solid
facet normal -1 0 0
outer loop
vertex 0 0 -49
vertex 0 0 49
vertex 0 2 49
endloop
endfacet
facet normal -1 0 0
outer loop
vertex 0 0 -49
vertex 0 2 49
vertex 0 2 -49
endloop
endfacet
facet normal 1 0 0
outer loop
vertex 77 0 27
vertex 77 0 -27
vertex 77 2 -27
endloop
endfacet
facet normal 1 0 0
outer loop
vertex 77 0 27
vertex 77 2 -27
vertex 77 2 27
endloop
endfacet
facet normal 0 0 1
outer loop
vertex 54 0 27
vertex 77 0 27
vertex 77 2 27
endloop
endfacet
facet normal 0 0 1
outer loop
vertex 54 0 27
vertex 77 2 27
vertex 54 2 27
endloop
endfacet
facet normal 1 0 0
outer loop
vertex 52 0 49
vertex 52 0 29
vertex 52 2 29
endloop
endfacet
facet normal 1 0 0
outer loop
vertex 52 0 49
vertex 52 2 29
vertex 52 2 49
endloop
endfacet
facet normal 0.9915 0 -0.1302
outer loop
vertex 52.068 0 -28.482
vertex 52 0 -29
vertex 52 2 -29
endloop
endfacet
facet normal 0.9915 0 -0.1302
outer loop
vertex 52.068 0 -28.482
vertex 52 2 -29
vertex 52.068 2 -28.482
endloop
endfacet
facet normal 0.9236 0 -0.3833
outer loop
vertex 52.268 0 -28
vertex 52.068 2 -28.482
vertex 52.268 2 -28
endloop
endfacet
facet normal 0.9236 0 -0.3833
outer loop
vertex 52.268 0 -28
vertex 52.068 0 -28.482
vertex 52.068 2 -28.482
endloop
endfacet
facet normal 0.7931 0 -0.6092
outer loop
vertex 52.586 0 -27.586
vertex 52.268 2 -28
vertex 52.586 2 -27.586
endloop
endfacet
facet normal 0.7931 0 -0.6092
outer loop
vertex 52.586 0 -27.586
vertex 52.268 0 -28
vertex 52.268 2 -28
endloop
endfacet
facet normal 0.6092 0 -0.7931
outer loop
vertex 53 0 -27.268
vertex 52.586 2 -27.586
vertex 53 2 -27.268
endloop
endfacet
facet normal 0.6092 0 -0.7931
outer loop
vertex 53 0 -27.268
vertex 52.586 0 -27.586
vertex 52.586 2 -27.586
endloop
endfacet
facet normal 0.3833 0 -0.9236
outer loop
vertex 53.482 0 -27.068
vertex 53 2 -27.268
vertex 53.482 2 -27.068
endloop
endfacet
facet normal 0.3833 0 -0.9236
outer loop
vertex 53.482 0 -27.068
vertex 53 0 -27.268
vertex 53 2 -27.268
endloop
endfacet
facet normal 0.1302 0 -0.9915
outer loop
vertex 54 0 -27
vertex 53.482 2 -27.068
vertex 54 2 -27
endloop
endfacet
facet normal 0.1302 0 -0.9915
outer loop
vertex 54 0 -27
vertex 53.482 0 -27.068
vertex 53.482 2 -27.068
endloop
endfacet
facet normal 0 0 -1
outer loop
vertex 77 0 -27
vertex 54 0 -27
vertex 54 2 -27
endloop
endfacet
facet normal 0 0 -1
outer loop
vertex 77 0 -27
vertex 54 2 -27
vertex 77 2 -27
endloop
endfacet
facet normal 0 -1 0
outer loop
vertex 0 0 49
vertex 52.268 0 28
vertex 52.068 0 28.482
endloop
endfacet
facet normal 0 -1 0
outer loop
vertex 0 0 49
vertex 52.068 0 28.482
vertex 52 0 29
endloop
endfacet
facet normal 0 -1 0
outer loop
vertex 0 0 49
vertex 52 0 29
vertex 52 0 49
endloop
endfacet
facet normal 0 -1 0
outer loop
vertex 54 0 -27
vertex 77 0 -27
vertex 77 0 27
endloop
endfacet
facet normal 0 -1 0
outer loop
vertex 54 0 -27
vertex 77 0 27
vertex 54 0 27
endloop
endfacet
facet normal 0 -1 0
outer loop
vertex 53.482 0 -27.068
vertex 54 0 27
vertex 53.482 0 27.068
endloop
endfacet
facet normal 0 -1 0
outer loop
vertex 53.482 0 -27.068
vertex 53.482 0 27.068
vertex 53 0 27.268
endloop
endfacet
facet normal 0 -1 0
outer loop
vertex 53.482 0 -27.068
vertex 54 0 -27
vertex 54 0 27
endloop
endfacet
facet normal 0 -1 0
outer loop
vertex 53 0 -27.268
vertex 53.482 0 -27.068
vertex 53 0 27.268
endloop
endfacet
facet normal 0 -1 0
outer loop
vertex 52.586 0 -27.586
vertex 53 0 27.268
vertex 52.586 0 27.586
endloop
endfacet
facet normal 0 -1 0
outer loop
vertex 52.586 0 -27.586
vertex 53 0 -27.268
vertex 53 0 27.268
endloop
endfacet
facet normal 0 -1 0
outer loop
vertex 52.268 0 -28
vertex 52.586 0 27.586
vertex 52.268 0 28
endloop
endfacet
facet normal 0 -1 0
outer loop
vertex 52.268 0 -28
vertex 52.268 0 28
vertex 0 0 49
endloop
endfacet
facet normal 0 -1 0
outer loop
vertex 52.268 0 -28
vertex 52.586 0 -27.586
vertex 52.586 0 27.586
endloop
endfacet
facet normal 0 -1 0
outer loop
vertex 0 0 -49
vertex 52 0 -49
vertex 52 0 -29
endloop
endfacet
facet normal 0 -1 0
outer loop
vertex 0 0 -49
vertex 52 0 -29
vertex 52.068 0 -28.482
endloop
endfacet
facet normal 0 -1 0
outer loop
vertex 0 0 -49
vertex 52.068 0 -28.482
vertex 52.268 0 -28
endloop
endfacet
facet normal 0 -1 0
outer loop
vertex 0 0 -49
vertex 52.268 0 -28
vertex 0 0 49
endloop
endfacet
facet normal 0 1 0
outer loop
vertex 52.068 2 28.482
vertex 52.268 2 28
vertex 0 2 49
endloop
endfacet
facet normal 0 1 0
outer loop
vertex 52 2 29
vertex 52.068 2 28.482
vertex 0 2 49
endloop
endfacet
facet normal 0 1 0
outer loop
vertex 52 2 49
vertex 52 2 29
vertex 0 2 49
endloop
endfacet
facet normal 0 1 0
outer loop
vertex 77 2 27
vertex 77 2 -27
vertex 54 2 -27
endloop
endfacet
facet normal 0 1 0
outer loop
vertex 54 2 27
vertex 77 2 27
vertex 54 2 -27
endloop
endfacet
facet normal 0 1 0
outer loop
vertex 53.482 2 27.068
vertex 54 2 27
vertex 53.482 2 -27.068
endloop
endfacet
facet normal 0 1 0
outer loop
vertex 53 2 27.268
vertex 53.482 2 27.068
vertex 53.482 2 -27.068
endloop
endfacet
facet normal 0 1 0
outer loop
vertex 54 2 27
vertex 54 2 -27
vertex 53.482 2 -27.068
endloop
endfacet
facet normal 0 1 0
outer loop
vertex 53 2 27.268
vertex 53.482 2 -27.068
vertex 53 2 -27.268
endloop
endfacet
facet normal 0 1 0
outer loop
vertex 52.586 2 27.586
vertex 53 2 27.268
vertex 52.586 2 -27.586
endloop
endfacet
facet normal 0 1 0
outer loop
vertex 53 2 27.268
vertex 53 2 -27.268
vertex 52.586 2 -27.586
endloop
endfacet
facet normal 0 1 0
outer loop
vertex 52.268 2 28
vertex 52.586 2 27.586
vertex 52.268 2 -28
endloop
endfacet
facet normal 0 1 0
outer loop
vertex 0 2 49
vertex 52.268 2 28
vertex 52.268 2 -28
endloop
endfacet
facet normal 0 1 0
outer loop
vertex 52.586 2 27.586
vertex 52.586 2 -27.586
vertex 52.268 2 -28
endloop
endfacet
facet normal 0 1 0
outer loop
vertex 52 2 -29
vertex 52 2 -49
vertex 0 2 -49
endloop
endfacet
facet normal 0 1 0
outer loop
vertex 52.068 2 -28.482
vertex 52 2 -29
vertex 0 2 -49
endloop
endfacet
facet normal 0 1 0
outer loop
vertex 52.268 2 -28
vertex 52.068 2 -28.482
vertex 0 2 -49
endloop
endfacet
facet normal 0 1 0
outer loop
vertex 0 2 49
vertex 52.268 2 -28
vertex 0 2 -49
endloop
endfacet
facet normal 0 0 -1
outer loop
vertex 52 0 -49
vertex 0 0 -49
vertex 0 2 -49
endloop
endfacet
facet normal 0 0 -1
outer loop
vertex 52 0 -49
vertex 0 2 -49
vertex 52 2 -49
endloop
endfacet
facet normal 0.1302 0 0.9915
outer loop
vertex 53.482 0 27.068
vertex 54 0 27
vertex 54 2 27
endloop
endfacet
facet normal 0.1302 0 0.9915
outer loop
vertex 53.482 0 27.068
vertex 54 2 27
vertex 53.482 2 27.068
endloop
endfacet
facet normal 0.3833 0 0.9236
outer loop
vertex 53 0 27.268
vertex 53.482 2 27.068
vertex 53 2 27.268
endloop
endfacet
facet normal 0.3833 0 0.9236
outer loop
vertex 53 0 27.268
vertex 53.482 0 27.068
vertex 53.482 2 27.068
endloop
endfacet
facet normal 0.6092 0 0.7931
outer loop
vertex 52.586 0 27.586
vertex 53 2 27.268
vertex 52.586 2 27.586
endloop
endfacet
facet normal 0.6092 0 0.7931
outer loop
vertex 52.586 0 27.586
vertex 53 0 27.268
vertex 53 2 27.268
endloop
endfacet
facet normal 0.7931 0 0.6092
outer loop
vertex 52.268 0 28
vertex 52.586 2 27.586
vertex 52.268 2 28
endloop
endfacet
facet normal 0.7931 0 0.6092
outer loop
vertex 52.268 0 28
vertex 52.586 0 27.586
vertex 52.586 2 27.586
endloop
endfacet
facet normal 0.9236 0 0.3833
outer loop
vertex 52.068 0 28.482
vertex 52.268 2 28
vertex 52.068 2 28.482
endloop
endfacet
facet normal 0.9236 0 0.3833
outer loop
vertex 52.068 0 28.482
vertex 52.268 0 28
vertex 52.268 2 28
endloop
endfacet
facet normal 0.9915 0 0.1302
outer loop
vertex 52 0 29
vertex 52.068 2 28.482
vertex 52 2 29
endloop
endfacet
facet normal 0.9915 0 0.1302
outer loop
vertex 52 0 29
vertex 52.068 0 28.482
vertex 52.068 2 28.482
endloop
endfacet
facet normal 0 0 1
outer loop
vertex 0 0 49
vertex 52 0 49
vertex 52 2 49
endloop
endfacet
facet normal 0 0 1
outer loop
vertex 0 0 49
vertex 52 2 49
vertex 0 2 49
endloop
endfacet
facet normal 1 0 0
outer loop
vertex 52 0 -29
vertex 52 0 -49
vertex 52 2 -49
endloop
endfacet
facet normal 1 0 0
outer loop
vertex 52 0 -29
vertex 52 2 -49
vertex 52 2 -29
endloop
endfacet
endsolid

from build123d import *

# Parameters (mm, degrees)
SALIENTE_EXTRUIR1_DEPTH = 2


with BuildPart() as part:
    # Croquis1 → Saliente-Extruir1 (new body)
    with BuildSketch(Plane(origin=(0, 0, 0), x_dir=(1, 0, 0), z_dir=(0, 1, 0))):
        with BuildLine():
            Line((0, -49), (0, 49))
            Line((0, 49), (52, 49))
            Line((52, 49), (52, 29))
            ThreePointArc((52, 29), (52.585786438, 27.585786438), (54, 27))
            Line((54, 27), (77, 27))
            Line((77, 27), (77, -27))
            Line((77, -27), (54, -27))
            ThreePointArc((54, -27), (52.585786438, -27.585786438), (52, -29))
            Line((52, -29), (52, -49))
            Line((52, -49), (0, -49))
        make_face()
    extrude(amount=SALIENTE_EXTRUIR1_DEPTH)


solid = part.part
